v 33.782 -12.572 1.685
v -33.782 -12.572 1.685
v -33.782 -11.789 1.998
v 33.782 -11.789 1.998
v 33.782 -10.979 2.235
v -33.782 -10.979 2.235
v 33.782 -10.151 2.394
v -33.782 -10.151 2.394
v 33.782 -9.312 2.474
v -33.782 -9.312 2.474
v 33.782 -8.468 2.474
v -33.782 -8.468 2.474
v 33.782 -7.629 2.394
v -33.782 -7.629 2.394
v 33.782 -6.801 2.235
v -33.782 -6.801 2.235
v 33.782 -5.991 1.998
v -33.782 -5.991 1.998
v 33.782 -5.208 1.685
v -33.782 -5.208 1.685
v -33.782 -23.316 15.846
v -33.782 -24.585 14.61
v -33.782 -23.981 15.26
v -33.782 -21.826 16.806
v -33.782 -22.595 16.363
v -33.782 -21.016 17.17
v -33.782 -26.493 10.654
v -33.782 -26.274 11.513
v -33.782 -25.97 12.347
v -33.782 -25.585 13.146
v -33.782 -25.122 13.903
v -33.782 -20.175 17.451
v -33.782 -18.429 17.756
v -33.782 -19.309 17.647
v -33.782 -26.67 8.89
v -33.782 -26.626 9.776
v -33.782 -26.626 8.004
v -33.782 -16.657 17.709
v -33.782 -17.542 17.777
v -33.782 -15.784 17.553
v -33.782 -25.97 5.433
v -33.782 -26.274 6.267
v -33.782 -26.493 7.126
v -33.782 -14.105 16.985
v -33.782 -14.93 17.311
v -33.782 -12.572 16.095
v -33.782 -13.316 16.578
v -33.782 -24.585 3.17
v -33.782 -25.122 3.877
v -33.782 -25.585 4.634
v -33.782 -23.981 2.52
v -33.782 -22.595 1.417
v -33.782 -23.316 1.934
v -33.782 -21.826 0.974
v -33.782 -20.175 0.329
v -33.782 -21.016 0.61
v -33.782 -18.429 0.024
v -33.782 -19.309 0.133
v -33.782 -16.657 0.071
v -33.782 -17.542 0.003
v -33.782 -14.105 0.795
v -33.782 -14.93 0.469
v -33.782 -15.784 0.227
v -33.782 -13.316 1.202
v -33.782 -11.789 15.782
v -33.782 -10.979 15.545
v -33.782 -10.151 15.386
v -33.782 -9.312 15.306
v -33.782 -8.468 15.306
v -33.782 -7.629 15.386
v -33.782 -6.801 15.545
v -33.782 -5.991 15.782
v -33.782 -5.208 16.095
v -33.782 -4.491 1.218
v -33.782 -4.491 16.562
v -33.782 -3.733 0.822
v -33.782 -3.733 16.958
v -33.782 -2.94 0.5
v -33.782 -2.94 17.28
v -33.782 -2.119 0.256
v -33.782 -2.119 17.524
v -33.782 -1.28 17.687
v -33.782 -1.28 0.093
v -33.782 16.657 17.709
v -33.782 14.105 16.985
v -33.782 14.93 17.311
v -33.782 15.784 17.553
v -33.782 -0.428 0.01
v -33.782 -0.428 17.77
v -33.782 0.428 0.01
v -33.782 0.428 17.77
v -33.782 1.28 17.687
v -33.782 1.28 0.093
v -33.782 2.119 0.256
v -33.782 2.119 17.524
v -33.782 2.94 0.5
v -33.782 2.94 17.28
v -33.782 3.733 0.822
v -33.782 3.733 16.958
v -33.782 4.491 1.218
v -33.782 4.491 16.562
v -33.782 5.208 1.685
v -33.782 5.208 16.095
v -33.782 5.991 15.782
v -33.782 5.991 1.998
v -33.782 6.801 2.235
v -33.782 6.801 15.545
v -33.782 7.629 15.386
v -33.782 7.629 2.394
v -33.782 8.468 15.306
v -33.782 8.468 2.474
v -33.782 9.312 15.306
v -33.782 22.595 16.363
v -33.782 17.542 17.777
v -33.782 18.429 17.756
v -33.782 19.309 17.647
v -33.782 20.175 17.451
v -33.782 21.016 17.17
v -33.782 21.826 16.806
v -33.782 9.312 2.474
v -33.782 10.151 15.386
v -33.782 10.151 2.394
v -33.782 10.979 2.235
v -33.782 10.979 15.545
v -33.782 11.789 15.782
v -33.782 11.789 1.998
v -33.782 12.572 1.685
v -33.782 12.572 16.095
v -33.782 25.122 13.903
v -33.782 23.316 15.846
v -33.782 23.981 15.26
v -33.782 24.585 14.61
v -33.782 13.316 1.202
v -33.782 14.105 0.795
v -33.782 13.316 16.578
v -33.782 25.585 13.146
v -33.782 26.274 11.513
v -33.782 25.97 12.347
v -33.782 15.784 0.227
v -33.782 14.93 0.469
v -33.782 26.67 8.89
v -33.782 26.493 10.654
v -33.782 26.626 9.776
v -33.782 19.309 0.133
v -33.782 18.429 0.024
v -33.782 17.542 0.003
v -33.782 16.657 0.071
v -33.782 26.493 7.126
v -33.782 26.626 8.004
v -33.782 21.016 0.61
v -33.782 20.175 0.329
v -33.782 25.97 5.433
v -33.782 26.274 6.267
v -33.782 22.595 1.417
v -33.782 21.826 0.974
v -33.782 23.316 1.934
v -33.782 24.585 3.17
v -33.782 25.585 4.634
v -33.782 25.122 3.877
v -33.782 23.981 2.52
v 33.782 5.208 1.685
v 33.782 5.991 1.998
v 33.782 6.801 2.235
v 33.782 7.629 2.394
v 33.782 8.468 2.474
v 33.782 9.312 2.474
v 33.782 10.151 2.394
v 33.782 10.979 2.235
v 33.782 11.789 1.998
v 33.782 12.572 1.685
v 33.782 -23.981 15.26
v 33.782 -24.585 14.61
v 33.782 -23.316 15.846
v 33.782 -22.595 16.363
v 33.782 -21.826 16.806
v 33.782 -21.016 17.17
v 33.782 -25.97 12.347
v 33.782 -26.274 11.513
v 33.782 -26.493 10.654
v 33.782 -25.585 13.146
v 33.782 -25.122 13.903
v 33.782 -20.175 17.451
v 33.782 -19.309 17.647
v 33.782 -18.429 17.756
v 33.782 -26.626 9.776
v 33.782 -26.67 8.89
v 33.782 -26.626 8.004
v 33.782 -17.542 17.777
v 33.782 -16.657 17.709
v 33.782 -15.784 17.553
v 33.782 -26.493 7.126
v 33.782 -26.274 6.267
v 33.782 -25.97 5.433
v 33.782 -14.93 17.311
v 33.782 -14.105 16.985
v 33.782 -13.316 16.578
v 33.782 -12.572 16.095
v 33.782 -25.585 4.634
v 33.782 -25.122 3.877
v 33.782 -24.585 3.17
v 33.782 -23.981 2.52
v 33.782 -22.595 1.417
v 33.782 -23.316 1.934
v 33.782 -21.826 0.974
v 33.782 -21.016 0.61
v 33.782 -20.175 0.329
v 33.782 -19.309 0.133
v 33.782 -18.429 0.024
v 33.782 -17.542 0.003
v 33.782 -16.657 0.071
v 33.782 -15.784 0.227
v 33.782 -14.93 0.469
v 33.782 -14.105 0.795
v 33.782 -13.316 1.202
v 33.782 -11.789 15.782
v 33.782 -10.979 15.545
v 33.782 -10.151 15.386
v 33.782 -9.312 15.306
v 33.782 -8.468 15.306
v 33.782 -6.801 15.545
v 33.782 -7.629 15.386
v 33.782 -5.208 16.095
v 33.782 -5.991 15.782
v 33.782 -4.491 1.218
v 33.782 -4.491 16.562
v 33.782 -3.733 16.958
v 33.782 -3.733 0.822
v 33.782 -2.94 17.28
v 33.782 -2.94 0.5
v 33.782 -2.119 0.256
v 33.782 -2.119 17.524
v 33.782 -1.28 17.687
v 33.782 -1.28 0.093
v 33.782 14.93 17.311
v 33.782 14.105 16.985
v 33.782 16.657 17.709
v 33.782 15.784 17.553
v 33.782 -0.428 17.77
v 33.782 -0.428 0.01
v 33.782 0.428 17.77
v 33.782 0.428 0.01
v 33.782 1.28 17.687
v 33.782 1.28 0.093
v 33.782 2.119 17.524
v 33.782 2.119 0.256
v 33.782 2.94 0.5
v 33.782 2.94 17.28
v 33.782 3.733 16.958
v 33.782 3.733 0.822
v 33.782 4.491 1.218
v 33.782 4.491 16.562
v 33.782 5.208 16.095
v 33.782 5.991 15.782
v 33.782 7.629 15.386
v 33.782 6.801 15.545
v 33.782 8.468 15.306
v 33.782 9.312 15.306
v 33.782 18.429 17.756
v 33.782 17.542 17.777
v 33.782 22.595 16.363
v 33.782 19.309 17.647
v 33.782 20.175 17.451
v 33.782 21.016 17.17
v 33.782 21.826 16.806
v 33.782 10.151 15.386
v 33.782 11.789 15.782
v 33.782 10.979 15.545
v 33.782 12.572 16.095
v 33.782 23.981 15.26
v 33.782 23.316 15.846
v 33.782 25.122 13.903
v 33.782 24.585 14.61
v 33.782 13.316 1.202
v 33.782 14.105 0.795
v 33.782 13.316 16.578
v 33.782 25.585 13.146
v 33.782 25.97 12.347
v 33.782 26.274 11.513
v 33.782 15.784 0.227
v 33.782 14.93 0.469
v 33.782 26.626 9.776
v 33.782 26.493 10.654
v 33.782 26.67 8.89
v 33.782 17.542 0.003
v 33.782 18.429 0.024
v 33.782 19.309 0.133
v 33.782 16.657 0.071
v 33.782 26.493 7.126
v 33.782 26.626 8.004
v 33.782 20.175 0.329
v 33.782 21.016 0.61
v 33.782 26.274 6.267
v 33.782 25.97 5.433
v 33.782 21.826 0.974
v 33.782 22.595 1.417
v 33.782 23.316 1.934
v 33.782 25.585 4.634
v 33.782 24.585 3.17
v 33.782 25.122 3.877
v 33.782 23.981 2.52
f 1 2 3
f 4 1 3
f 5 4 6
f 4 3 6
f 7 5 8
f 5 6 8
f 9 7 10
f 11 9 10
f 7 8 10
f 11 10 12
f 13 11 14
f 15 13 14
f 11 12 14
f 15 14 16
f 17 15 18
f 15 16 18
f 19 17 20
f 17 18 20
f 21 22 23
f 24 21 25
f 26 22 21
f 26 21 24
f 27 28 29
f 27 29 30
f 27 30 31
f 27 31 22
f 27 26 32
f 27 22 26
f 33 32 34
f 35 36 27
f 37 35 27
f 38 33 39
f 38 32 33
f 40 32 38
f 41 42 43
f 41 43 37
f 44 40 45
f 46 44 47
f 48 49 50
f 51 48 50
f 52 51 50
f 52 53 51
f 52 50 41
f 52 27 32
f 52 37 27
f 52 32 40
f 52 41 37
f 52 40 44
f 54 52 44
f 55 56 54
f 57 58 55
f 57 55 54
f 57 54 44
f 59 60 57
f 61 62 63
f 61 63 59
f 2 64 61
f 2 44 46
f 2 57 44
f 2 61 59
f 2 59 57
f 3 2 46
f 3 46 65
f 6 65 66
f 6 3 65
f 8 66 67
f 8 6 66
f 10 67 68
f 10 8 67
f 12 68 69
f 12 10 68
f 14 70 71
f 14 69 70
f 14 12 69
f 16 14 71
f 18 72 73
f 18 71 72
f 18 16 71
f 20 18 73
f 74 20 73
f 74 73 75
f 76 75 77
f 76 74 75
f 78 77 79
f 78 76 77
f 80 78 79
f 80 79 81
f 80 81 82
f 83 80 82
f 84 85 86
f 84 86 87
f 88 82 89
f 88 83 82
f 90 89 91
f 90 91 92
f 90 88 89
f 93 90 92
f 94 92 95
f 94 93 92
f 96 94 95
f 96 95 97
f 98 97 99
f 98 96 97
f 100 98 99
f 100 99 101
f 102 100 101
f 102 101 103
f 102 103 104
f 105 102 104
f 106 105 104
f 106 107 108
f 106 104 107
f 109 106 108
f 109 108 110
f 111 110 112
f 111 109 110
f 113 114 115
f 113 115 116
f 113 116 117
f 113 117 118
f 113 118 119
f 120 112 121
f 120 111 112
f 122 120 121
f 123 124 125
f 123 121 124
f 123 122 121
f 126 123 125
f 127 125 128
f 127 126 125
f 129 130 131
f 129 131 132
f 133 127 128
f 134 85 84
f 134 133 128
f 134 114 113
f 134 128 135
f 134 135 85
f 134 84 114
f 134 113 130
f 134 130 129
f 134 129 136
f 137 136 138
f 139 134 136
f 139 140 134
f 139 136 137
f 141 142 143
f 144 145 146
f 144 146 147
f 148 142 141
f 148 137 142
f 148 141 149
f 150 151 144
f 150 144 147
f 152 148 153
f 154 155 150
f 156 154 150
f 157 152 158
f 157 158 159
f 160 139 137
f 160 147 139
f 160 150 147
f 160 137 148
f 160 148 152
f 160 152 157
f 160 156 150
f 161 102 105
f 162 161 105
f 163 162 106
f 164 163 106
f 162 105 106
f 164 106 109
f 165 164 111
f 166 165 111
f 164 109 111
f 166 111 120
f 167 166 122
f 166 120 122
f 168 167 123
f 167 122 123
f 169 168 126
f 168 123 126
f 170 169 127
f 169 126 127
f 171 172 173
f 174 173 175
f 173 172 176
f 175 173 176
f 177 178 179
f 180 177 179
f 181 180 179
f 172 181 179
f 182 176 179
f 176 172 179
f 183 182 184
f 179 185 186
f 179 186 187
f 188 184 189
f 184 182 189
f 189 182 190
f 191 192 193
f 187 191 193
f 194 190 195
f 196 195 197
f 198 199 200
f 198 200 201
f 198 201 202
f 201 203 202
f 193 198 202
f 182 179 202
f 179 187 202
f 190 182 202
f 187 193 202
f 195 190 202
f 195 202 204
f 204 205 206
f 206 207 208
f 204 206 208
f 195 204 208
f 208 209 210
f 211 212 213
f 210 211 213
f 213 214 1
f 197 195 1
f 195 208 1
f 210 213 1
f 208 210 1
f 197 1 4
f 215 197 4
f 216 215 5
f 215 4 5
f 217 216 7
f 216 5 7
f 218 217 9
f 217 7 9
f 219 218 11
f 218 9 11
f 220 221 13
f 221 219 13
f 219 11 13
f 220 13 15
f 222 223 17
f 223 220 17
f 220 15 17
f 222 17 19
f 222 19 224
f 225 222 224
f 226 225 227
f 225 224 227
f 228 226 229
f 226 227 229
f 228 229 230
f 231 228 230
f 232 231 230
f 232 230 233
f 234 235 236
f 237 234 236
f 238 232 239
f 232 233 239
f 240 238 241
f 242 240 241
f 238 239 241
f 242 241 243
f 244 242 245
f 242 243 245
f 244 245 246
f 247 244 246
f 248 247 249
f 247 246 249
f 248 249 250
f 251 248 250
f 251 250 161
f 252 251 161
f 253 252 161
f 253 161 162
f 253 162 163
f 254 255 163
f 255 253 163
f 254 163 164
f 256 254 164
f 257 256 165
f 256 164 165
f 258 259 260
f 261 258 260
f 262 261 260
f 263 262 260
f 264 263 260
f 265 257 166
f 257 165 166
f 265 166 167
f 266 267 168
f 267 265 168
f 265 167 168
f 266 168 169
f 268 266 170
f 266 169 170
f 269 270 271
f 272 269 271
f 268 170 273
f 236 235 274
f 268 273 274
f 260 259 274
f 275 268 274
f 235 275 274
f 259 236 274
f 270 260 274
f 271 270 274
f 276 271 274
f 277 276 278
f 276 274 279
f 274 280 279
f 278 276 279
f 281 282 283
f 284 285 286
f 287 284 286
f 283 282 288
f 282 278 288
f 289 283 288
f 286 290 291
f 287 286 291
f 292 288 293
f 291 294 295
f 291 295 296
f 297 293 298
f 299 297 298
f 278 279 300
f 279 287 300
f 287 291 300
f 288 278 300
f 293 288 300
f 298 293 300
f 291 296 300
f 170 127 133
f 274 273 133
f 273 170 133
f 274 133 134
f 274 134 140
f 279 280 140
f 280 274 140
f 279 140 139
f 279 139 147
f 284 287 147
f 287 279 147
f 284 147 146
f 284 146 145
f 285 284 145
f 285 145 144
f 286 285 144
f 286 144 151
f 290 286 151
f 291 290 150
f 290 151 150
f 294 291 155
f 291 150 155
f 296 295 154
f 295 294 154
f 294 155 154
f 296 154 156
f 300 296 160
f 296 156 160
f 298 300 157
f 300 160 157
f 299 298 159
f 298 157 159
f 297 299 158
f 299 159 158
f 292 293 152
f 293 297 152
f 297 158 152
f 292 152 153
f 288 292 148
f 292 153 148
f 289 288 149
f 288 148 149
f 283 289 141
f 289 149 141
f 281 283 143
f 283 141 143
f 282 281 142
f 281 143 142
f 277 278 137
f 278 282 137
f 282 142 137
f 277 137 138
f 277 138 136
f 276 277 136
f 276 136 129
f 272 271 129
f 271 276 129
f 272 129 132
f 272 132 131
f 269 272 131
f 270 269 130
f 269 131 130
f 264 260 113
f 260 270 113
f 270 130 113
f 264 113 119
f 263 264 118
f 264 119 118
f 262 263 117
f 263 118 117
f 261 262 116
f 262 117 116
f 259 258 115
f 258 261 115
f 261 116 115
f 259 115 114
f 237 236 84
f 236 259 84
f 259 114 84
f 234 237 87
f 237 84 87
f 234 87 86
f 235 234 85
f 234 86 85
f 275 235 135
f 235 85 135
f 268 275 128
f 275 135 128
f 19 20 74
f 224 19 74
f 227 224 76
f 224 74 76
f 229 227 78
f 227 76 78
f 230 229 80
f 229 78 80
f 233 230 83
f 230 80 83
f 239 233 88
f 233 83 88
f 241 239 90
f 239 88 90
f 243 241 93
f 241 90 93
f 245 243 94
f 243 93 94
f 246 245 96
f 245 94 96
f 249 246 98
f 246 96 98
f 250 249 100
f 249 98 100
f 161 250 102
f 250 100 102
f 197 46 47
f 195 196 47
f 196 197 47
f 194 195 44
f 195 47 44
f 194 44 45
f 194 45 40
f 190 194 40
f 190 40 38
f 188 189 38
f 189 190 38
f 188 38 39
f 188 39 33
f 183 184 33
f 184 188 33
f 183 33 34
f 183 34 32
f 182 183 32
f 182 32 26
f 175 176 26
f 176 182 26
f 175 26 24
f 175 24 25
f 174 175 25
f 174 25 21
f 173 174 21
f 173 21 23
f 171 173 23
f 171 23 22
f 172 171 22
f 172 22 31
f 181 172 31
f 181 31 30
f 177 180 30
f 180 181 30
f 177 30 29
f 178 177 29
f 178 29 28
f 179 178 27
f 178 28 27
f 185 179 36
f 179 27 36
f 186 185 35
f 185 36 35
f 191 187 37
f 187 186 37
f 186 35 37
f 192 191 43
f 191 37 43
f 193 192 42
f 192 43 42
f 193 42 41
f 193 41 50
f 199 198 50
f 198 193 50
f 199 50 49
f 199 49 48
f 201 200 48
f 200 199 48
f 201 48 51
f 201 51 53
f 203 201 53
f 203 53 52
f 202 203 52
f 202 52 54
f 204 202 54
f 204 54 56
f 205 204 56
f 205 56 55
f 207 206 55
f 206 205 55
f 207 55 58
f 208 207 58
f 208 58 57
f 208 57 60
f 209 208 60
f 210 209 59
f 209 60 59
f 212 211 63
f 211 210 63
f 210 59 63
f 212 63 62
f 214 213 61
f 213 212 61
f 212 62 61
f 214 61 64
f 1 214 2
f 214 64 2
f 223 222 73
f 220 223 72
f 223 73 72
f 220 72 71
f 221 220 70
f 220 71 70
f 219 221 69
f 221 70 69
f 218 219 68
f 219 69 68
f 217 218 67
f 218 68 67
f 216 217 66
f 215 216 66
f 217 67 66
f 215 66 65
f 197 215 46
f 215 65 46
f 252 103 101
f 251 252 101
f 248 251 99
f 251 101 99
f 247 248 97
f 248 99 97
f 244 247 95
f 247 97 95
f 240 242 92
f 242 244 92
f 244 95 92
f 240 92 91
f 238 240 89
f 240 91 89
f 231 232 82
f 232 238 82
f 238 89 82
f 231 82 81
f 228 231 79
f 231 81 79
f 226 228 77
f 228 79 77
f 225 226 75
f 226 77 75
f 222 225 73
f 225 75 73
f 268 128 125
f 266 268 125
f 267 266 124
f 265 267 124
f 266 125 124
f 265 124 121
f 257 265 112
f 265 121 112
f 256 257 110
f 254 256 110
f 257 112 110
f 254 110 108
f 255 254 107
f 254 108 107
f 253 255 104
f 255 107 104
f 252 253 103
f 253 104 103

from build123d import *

# Parameters (mm, degrees)
SKETCH1_W              = 67.564
SKETCH1_H              = 55.88
BOSS_EXTRUDE1_DEPTH    = 17.78
SPLIT1_SURFACE_1_BACK  = 90.463
SPLIT1_SURFACE_1_DEPTH = 180.926


with BuildPart() as part:
    # Sketch1 → Boss-Extrude1 (new body)
    with BuildSketch(Plane.XY):
        Rectangle(SKETCH1_W, SKETCH1_H)
    extrude(amount=BOSS_EXTRUDE1_DEPTH)

    # Split1: cut with a surface, the side it looks to stays
    # Split1 surface: a surface, the sketch's curves swept straight by 180.926 mm
    with BuildLine(Plane(origin=(33.782, 0, 0), x_dir=(0, 0, -1), z_dir=(1, 0, 0)).offset(-SPLIT1_SURFACE_1_BACK), mode=Mode.PRIVATE) as split1_surface_1_path:
        ThreePointArc((-1.685204779, 12.572022866), (-8.89, 26.67), (-16.094795221, 12.572022866))
        ThreePointArc((-16.094795221, 12.572022866), (-15.296445708, 8.89), (-16.094795221, 5.207977134))
        ThreePointArc((-16.094795221, 5.207977134), (-17.78, 0), (-16.094795221, -5.207977134))
        ThreePointArc((-16.094795221, -5.207977134), (-15.296445708, -8.89), (-16.094795221, -12.572022866))
        ThreePointArc((-16.094795221, -12.572022866), (-8.89, -26.67), (-1.685204779, -12.572022866))
        ThreePointArc((-1.685204779, -12.572022866), (-2.483554292, -8.89), (-1.685204779, -5.207977134))
        ThreePointArc((-1.685204779, -5.207977134), (0, 0), (-1.685204779, 5.207977134))
        ThreePointArc((-1.685204779, 5.207977134), (-2.483554292, 8.89), (-1.685204779, 12.572022866))
    split1_surface_1 = Shell.extrude(split1_surface_1_path.wire(), (1 * SPLIT1_SURFACE_1_DEPTH, 0 * SPLIT1_SURFACE_1_DEPTH, 0 * SPLIT1_SURFACE_1_DEPTH))
    split(bisect_by=split1_surface_1, keep=Keep.TOP)


solid = part.part
